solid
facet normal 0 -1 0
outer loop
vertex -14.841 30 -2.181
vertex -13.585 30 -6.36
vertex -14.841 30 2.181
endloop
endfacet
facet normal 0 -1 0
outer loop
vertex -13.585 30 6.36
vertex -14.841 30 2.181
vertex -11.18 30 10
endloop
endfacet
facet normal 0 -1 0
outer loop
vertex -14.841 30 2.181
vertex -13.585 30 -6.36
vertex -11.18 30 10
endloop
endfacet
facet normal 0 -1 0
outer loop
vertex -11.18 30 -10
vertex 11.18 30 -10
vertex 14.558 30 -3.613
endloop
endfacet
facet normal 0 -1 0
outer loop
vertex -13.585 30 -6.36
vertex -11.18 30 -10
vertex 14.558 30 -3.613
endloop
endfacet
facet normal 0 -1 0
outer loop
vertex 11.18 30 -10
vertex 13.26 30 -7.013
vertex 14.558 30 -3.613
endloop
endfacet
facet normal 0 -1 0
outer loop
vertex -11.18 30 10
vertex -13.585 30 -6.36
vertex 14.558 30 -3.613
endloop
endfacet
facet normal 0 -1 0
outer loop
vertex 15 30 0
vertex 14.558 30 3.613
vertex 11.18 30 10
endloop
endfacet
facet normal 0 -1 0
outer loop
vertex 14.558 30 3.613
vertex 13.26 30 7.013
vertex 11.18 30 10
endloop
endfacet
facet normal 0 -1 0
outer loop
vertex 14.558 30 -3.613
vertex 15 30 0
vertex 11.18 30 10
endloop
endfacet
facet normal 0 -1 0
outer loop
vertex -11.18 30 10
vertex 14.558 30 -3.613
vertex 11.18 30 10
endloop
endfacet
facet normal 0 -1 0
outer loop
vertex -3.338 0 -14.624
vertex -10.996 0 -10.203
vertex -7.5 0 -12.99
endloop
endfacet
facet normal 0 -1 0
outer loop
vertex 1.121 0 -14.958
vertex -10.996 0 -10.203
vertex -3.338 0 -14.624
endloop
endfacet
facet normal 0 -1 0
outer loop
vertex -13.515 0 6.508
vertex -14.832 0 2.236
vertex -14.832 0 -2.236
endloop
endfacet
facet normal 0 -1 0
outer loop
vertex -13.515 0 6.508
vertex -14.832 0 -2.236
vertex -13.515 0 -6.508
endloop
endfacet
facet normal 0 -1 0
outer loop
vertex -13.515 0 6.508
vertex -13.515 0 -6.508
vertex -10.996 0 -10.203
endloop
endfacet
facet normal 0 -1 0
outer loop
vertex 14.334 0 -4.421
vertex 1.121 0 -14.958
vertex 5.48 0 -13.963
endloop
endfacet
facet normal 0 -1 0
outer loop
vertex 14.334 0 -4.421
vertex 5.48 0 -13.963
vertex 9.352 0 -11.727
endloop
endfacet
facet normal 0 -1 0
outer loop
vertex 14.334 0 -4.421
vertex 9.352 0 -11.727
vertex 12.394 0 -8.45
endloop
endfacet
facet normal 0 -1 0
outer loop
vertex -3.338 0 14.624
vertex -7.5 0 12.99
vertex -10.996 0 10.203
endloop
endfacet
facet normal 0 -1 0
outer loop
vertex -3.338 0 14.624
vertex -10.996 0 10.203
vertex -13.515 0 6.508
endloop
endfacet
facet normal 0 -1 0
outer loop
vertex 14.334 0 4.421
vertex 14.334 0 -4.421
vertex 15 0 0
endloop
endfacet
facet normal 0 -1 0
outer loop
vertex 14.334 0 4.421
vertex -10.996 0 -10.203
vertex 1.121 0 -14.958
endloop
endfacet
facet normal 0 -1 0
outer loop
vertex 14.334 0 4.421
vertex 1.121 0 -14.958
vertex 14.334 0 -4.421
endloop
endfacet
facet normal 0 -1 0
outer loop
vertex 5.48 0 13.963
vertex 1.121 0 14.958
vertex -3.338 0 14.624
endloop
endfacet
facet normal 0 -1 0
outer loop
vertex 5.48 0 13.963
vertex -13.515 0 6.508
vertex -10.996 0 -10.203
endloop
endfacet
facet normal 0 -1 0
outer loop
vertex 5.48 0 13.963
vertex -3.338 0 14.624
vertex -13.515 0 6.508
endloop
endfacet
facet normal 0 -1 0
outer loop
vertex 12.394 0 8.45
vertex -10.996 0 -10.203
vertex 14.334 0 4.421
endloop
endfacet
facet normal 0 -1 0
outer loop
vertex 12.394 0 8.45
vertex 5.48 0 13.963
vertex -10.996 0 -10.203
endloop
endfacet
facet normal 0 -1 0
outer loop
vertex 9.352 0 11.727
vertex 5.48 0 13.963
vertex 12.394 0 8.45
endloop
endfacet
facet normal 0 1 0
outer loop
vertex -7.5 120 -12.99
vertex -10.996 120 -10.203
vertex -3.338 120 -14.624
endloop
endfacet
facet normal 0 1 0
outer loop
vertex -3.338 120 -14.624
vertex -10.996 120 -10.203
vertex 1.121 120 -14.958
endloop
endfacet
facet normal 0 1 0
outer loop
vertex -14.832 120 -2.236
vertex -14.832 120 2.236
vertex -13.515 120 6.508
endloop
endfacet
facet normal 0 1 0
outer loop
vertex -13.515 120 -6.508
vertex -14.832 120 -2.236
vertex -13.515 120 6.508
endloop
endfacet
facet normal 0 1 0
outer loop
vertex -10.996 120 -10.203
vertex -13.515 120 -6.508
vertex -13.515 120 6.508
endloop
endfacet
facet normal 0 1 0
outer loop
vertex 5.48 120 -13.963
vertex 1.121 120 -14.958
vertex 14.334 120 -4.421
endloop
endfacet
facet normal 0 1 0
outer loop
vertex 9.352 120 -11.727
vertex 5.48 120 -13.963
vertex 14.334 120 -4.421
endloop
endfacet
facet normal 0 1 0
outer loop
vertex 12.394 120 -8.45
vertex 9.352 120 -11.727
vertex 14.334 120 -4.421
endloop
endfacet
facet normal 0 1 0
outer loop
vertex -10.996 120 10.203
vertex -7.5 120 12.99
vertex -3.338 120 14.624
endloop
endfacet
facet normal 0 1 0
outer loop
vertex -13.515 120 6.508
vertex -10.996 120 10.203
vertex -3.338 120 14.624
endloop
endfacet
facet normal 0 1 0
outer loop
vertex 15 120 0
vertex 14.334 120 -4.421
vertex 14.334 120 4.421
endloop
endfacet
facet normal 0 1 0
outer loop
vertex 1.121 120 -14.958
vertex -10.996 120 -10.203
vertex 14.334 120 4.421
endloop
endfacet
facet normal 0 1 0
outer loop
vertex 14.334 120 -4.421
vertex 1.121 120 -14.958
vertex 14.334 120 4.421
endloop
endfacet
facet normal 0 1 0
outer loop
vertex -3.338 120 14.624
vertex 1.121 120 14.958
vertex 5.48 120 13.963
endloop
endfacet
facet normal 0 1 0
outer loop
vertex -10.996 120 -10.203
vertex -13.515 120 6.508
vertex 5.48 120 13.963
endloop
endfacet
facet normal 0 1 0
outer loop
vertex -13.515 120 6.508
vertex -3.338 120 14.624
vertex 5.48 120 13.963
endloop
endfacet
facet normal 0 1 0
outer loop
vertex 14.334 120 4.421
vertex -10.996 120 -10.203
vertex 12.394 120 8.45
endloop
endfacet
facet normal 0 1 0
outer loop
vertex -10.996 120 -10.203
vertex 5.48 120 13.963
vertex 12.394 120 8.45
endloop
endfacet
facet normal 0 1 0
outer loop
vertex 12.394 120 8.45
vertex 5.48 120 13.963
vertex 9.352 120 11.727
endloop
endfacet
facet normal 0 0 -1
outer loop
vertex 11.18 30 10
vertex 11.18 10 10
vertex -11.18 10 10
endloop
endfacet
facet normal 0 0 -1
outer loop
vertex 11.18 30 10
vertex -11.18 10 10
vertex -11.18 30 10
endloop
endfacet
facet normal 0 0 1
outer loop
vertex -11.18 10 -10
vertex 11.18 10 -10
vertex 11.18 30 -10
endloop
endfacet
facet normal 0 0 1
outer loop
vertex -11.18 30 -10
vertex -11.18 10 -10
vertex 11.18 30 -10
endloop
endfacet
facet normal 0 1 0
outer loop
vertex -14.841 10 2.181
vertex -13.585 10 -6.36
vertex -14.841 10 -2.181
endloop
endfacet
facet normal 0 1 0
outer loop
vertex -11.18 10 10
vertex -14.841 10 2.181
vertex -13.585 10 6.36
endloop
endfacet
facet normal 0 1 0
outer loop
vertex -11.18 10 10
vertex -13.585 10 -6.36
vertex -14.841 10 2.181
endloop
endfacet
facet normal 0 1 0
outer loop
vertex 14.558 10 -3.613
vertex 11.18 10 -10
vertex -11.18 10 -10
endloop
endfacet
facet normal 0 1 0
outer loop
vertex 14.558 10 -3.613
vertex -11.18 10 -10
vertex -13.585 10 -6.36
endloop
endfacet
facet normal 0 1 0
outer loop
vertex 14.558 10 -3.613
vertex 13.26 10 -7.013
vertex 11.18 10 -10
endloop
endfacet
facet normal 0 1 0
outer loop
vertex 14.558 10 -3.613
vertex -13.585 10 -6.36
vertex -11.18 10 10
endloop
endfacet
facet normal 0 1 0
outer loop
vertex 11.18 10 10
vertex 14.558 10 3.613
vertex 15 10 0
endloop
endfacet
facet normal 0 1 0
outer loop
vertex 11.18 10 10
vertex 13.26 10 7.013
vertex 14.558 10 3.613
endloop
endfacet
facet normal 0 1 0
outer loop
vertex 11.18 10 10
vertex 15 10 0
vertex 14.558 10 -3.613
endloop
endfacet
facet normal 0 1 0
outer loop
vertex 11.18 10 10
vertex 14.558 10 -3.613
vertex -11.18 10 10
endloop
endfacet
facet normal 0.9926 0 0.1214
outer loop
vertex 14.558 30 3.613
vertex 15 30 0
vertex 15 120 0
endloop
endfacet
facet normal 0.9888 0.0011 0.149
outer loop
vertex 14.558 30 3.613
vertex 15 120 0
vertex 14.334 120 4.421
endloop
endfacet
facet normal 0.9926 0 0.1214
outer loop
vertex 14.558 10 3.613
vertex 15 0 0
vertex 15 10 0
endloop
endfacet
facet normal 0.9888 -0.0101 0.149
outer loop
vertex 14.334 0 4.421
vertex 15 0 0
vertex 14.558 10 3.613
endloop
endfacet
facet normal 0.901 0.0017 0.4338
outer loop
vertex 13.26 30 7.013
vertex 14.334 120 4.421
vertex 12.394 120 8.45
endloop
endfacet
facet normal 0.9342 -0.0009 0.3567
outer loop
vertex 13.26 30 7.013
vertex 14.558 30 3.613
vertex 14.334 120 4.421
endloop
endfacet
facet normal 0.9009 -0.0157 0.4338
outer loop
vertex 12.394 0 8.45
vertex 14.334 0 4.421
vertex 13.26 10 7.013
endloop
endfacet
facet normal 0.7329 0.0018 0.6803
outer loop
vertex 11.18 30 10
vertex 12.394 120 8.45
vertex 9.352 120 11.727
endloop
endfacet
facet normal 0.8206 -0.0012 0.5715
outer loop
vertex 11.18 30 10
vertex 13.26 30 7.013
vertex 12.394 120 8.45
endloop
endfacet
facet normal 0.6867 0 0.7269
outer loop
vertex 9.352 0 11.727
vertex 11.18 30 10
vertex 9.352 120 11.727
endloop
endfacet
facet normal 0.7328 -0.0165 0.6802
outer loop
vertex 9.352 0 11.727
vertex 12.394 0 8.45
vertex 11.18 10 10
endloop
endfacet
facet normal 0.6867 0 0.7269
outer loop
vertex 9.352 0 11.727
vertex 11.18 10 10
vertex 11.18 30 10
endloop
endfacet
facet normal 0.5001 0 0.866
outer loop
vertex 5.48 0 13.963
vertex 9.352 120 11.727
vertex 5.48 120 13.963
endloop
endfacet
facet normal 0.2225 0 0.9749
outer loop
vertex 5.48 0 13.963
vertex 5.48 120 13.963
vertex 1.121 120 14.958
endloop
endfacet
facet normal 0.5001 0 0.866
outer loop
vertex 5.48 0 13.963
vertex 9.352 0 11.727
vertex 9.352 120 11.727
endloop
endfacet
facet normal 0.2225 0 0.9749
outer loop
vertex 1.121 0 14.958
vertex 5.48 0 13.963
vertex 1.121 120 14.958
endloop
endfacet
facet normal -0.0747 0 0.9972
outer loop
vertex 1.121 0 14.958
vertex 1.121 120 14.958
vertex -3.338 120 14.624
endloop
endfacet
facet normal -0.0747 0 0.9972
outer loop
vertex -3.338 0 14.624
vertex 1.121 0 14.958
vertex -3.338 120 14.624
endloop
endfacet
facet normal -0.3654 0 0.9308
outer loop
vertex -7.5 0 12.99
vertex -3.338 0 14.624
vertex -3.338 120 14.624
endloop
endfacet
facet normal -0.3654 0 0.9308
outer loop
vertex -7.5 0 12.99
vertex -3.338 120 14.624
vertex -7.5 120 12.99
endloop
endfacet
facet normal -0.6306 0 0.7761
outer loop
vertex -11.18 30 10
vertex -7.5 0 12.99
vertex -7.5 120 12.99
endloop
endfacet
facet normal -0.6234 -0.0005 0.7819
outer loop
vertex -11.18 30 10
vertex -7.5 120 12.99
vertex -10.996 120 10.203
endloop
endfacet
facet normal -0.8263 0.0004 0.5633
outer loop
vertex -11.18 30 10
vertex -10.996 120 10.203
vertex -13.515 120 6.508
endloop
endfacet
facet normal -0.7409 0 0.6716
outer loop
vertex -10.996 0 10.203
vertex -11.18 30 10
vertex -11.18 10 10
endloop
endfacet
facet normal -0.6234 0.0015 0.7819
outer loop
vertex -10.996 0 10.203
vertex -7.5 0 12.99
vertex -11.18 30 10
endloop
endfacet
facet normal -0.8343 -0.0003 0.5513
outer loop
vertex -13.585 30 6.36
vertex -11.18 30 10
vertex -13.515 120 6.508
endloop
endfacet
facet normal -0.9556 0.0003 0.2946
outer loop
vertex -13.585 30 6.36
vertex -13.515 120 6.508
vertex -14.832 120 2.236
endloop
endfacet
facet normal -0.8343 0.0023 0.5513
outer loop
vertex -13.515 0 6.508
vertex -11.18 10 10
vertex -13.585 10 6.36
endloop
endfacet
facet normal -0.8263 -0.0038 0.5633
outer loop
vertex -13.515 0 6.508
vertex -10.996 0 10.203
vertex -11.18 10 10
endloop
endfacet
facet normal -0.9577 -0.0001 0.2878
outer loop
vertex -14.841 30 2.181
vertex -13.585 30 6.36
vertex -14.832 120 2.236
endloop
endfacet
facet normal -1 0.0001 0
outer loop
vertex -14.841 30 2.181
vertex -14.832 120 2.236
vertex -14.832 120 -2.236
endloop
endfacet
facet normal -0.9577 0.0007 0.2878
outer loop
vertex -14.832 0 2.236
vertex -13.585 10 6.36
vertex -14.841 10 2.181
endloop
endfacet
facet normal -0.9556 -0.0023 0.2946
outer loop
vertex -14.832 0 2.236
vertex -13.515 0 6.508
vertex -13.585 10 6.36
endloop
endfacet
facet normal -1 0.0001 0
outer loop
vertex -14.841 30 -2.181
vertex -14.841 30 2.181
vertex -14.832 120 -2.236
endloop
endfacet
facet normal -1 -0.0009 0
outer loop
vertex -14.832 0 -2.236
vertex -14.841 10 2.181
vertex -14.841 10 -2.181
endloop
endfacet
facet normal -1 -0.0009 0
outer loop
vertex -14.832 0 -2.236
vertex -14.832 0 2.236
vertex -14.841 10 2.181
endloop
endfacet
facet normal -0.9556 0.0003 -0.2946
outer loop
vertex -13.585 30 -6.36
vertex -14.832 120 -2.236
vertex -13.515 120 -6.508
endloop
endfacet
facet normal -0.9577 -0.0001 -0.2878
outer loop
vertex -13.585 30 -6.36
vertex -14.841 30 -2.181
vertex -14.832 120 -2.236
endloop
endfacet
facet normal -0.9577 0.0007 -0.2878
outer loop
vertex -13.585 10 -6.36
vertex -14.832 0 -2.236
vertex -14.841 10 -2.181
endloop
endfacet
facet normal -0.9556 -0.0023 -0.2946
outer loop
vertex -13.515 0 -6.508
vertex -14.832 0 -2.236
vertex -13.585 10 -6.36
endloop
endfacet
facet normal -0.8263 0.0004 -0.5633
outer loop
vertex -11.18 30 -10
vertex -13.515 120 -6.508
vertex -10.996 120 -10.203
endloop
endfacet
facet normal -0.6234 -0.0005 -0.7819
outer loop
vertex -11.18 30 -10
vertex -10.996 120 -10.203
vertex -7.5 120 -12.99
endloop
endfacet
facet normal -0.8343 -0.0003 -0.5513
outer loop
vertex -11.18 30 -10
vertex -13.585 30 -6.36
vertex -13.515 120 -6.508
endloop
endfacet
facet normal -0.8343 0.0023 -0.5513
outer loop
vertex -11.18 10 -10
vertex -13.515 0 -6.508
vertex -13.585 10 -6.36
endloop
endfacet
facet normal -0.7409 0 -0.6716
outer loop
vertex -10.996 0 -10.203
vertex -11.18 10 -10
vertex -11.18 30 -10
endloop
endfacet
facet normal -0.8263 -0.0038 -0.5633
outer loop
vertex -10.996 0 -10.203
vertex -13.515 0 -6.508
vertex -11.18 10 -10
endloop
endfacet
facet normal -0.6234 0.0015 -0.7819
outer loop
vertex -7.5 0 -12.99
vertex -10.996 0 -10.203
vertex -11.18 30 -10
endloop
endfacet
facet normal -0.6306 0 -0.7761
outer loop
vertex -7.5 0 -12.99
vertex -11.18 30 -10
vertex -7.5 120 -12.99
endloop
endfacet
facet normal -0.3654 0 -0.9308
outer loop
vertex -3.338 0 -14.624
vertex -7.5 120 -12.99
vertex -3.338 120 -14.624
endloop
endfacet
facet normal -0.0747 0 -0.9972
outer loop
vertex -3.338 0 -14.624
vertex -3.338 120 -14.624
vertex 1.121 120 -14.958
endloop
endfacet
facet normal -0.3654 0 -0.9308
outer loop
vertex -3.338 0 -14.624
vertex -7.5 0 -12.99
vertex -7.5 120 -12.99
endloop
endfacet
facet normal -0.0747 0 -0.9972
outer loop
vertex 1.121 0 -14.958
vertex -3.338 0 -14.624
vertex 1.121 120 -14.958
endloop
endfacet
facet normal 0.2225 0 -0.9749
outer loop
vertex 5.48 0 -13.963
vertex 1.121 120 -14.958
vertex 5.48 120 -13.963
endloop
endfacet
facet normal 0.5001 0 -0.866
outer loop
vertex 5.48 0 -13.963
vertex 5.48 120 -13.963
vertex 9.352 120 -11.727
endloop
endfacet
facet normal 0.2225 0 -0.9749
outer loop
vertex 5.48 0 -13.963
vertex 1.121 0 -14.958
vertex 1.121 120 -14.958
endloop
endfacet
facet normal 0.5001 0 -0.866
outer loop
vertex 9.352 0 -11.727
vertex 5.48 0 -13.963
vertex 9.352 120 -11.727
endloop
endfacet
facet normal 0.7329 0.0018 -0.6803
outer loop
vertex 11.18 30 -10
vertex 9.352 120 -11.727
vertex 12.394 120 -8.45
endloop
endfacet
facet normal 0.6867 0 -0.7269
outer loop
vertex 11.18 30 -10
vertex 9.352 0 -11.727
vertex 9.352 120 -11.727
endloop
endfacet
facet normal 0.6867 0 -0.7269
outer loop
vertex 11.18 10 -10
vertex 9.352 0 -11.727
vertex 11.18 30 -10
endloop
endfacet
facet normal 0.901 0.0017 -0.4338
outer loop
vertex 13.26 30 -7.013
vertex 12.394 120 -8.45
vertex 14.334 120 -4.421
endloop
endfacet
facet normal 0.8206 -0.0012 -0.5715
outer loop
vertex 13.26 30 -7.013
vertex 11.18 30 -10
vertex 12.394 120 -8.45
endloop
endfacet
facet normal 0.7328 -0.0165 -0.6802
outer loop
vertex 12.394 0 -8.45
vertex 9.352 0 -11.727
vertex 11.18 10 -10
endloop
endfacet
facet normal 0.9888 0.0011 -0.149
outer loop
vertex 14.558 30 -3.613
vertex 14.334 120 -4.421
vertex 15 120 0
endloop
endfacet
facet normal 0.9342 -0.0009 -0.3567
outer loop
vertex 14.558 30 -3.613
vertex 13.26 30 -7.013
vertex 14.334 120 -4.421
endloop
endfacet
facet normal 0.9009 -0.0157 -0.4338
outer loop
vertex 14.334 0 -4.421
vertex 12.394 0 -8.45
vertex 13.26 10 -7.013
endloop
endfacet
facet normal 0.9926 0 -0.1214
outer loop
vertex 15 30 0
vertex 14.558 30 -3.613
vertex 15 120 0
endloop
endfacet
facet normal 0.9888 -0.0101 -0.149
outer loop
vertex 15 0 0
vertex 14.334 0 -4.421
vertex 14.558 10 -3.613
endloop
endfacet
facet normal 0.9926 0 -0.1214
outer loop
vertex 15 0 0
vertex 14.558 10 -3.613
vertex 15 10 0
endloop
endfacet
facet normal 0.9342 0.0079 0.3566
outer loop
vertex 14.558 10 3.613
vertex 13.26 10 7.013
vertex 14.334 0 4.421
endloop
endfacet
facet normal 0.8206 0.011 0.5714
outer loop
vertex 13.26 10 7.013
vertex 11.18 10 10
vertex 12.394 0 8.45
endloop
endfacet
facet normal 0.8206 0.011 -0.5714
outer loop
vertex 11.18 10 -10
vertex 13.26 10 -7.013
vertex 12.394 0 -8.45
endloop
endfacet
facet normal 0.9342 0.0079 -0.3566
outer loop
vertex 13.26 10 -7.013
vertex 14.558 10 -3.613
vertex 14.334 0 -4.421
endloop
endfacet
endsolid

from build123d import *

# Parameters (mm, degrees)
F0_R     = 15
F1_DEPTH = 120
F2_W     = 20
F2_H     = 20
F3_DEPTH = 31


with BuildPart() as f1:
    # F0 (on Front) → F1 (new body)
    with BuildSketch(Plane.XZ):
        Circle(F0_R)
    extrude(amount=-F1_DEPTH)

    # F2 (on Right) → F3 (cut, symmetric)
    with BuildSketch(Plane.YZ):
        with Locations((20, 0)):
            Rectangle(F2_W, F2_H)
    extrude(amount=F3_DEPTH, both=True, mode=Mode.SUBTRACT)


solid = f1.part
